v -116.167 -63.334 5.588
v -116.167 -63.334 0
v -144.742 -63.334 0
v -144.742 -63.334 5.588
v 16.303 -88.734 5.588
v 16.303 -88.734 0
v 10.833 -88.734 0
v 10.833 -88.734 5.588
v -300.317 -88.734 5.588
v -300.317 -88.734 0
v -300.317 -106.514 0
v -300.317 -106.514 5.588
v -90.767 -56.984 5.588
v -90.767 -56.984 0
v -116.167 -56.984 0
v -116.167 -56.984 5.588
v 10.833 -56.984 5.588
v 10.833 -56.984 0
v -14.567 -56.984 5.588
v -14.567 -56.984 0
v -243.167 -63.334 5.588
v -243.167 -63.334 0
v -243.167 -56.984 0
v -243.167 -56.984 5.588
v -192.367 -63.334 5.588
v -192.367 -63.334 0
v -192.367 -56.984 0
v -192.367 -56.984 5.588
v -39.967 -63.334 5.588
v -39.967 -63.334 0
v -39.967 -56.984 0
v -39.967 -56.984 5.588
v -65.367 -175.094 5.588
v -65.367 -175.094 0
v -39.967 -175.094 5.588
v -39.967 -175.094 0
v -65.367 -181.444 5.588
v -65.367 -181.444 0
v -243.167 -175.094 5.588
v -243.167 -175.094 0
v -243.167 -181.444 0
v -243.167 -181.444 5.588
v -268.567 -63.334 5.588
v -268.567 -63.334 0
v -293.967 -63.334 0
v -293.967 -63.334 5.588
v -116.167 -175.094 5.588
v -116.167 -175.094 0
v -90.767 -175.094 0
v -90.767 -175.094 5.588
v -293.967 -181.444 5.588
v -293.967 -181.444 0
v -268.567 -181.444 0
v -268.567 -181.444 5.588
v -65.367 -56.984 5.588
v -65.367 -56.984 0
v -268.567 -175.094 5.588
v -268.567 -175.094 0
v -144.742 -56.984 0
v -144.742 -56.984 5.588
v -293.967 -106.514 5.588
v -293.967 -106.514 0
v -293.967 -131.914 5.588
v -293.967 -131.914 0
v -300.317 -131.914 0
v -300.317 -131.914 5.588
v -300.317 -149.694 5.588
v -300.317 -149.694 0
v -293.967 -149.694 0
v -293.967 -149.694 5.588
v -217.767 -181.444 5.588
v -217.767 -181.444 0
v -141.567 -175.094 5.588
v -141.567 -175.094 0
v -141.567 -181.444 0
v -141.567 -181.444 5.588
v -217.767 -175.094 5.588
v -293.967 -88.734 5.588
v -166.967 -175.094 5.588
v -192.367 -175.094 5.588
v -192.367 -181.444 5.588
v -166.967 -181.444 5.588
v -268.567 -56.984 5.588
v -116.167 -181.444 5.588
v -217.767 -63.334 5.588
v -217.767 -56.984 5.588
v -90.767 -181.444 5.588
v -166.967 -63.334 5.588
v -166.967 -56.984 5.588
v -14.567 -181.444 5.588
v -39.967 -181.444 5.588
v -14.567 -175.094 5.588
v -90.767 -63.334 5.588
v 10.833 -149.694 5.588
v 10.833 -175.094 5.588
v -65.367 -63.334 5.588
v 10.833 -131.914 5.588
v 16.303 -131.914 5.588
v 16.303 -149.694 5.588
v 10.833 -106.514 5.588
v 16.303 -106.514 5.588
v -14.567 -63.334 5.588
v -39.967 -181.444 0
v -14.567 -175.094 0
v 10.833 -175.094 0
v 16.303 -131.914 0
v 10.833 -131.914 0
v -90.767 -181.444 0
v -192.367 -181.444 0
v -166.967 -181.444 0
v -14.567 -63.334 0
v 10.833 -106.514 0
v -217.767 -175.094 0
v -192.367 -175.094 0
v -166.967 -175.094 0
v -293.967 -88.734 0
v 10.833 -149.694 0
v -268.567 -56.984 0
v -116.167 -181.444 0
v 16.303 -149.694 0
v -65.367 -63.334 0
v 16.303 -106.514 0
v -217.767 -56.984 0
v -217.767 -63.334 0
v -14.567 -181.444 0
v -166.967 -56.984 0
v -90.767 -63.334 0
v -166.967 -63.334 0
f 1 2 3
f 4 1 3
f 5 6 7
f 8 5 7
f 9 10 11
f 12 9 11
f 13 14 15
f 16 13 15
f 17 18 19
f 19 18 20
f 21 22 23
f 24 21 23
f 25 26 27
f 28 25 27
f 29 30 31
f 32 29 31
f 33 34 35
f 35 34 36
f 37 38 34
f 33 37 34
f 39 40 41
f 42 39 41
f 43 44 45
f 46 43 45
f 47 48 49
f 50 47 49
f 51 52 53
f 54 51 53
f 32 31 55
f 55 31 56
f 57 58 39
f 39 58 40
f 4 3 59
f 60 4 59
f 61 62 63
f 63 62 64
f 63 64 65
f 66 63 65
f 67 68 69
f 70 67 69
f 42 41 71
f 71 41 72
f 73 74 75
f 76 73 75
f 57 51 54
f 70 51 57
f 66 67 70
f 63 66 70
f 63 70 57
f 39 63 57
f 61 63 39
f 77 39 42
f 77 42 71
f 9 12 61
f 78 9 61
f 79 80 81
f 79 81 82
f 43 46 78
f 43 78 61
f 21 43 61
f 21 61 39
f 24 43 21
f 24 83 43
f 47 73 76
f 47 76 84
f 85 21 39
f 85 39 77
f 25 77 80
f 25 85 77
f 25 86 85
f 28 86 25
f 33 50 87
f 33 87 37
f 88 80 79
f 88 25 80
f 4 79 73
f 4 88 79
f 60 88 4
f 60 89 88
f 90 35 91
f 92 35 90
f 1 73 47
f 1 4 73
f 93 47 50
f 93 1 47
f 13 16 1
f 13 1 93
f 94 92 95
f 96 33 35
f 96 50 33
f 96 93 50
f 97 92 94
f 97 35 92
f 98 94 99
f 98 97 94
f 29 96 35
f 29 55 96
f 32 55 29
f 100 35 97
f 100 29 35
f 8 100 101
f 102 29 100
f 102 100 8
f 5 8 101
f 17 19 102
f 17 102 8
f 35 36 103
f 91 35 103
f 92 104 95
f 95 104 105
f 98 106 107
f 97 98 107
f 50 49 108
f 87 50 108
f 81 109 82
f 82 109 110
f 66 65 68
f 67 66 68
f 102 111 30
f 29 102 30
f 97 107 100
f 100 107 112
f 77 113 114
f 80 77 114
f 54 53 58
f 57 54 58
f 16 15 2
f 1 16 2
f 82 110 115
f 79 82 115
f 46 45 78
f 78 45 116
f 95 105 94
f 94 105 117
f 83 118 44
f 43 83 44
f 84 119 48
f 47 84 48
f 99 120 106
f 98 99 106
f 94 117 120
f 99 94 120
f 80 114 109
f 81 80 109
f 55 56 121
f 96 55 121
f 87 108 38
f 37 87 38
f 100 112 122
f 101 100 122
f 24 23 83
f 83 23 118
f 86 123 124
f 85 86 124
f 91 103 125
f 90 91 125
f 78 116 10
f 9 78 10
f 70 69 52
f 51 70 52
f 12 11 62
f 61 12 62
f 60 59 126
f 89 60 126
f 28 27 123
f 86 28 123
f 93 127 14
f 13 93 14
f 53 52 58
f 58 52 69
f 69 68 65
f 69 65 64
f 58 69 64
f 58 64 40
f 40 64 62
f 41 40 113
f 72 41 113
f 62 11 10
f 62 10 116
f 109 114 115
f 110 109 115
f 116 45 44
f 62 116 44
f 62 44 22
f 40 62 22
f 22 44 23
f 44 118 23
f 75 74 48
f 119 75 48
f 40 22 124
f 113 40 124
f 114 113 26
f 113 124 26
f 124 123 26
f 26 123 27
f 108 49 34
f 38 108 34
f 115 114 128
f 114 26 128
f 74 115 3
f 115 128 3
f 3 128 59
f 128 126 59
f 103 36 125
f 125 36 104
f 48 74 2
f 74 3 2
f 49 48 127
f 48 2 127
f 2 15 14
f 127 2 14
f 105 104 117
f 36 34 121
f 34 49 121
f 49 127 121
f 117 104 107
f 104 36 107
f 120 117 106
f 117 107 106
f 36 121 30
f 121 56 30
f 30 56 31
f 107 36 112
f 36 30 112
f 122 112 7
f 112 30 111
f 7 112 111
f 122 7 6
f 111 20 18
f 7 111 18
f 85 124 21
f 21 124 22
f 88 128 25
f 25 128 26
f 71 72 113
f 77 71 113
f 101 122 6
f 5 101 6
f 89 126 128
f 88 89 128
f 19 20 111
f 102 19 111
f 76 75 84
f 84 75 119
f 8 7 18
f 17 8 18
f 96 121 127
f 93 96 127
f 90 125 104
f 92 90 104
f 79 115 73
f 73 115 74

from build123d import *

# Parameters (mm, degrees)
BOSS_EXTRUDE1_DEPTH = 5.588


with BuildPart() as part:
    # Sketch1 → Boss-Extrude1 (new body)
    with BuildSketch(Plane(origin=(-5.329574036, -16.20301374, 0), x_dir=(1, 0, 0), z_dir=(0, 0, 1))):
        Polygon((-288.637525151, -72.531124316), (-294.987525151, -72.531124316), (-294.987525151, -90.311124316), (-288.637525151, -90.311124316), (-288.637525151, -115.711124316), (-294.987525151, -115.711124316), (-294.987525151, -133.491124316), (-288.637525151, -133.491124316), (-288.637525151, -165.241124316), (-263.237525151, -165.241124316), (-263.237525151, -158.891124316), (-237.837525151, -158.891124316), (-237.837525151, -165.241124316), (-212.437525151, -165.241124316), (-212.437525151, -158.891124316), (-187.037525151, -158.891124316), (-187.037525151, -165.241124316), (-161.637525151, -165.241124316), (-161.637525151, -158.891124316), (-136.237525151, -158.891124316), (-136.237525151, -165.241124316), (-110.837525151, -165.241124316), (-110.837525151, -158.891124316), (-85.437525151, -158.891124316), (-85.437525151, -165.241124316), (-60.037525151, -165.241124316), (-60.037525151, -158.891124316), (-34.637525151, -158.891124316), (-34.637525151, -165.241124316), (-9.237525151, -165.241124316), (-9.237525151, -158.891124316), (16.162474849, -158.891124316), (16.162474849, -133.491124316), (21.632687755, -133.491124316), (21.632687755, -115.711124316), (16.162474849, -115.711124316), (16.162474849, -90.311124316), (21.632687755, -90.311124316), (21.632687755, -72.531124316), (16.162474849, -72.531124316), (16.162474849, -40.781124316), (-9.237525151, -40.781124316), (-9.237525151, -47.131124316), (-34.637525151, -47.131124316), (-34.637525151, -40.781124316), (-60.037525151, -40.781124316), (-60.037525151, -47.131124316), (-85.437525151, -47.131124316), (-85.437525151, -40.781124316), (-110.837525151, -40.781124316), (-110.837525151, -47.131124316), (-139.412525151, -47.131124316), (-139.412525151, -40.781124316), (-161.637525151, -40.781124316), (-161.637525151, -47.131124316), (-187.037525151, -47.131124316), (-187.037525151, -40.781124316), (-212.437525151, -40.781124316), (-212.437525151, -47.131124316), (-237.837525151, -47.131124316), (-237.837525151, -40.781124316), (-263.237525151, -40.781124316), (-263.237525151, -47.131124316), (-288.637525151, -47.131124316), align=None)
    extrude(amount=BOSS_EXTRUDE1_DEPTH)


solid = part.part
